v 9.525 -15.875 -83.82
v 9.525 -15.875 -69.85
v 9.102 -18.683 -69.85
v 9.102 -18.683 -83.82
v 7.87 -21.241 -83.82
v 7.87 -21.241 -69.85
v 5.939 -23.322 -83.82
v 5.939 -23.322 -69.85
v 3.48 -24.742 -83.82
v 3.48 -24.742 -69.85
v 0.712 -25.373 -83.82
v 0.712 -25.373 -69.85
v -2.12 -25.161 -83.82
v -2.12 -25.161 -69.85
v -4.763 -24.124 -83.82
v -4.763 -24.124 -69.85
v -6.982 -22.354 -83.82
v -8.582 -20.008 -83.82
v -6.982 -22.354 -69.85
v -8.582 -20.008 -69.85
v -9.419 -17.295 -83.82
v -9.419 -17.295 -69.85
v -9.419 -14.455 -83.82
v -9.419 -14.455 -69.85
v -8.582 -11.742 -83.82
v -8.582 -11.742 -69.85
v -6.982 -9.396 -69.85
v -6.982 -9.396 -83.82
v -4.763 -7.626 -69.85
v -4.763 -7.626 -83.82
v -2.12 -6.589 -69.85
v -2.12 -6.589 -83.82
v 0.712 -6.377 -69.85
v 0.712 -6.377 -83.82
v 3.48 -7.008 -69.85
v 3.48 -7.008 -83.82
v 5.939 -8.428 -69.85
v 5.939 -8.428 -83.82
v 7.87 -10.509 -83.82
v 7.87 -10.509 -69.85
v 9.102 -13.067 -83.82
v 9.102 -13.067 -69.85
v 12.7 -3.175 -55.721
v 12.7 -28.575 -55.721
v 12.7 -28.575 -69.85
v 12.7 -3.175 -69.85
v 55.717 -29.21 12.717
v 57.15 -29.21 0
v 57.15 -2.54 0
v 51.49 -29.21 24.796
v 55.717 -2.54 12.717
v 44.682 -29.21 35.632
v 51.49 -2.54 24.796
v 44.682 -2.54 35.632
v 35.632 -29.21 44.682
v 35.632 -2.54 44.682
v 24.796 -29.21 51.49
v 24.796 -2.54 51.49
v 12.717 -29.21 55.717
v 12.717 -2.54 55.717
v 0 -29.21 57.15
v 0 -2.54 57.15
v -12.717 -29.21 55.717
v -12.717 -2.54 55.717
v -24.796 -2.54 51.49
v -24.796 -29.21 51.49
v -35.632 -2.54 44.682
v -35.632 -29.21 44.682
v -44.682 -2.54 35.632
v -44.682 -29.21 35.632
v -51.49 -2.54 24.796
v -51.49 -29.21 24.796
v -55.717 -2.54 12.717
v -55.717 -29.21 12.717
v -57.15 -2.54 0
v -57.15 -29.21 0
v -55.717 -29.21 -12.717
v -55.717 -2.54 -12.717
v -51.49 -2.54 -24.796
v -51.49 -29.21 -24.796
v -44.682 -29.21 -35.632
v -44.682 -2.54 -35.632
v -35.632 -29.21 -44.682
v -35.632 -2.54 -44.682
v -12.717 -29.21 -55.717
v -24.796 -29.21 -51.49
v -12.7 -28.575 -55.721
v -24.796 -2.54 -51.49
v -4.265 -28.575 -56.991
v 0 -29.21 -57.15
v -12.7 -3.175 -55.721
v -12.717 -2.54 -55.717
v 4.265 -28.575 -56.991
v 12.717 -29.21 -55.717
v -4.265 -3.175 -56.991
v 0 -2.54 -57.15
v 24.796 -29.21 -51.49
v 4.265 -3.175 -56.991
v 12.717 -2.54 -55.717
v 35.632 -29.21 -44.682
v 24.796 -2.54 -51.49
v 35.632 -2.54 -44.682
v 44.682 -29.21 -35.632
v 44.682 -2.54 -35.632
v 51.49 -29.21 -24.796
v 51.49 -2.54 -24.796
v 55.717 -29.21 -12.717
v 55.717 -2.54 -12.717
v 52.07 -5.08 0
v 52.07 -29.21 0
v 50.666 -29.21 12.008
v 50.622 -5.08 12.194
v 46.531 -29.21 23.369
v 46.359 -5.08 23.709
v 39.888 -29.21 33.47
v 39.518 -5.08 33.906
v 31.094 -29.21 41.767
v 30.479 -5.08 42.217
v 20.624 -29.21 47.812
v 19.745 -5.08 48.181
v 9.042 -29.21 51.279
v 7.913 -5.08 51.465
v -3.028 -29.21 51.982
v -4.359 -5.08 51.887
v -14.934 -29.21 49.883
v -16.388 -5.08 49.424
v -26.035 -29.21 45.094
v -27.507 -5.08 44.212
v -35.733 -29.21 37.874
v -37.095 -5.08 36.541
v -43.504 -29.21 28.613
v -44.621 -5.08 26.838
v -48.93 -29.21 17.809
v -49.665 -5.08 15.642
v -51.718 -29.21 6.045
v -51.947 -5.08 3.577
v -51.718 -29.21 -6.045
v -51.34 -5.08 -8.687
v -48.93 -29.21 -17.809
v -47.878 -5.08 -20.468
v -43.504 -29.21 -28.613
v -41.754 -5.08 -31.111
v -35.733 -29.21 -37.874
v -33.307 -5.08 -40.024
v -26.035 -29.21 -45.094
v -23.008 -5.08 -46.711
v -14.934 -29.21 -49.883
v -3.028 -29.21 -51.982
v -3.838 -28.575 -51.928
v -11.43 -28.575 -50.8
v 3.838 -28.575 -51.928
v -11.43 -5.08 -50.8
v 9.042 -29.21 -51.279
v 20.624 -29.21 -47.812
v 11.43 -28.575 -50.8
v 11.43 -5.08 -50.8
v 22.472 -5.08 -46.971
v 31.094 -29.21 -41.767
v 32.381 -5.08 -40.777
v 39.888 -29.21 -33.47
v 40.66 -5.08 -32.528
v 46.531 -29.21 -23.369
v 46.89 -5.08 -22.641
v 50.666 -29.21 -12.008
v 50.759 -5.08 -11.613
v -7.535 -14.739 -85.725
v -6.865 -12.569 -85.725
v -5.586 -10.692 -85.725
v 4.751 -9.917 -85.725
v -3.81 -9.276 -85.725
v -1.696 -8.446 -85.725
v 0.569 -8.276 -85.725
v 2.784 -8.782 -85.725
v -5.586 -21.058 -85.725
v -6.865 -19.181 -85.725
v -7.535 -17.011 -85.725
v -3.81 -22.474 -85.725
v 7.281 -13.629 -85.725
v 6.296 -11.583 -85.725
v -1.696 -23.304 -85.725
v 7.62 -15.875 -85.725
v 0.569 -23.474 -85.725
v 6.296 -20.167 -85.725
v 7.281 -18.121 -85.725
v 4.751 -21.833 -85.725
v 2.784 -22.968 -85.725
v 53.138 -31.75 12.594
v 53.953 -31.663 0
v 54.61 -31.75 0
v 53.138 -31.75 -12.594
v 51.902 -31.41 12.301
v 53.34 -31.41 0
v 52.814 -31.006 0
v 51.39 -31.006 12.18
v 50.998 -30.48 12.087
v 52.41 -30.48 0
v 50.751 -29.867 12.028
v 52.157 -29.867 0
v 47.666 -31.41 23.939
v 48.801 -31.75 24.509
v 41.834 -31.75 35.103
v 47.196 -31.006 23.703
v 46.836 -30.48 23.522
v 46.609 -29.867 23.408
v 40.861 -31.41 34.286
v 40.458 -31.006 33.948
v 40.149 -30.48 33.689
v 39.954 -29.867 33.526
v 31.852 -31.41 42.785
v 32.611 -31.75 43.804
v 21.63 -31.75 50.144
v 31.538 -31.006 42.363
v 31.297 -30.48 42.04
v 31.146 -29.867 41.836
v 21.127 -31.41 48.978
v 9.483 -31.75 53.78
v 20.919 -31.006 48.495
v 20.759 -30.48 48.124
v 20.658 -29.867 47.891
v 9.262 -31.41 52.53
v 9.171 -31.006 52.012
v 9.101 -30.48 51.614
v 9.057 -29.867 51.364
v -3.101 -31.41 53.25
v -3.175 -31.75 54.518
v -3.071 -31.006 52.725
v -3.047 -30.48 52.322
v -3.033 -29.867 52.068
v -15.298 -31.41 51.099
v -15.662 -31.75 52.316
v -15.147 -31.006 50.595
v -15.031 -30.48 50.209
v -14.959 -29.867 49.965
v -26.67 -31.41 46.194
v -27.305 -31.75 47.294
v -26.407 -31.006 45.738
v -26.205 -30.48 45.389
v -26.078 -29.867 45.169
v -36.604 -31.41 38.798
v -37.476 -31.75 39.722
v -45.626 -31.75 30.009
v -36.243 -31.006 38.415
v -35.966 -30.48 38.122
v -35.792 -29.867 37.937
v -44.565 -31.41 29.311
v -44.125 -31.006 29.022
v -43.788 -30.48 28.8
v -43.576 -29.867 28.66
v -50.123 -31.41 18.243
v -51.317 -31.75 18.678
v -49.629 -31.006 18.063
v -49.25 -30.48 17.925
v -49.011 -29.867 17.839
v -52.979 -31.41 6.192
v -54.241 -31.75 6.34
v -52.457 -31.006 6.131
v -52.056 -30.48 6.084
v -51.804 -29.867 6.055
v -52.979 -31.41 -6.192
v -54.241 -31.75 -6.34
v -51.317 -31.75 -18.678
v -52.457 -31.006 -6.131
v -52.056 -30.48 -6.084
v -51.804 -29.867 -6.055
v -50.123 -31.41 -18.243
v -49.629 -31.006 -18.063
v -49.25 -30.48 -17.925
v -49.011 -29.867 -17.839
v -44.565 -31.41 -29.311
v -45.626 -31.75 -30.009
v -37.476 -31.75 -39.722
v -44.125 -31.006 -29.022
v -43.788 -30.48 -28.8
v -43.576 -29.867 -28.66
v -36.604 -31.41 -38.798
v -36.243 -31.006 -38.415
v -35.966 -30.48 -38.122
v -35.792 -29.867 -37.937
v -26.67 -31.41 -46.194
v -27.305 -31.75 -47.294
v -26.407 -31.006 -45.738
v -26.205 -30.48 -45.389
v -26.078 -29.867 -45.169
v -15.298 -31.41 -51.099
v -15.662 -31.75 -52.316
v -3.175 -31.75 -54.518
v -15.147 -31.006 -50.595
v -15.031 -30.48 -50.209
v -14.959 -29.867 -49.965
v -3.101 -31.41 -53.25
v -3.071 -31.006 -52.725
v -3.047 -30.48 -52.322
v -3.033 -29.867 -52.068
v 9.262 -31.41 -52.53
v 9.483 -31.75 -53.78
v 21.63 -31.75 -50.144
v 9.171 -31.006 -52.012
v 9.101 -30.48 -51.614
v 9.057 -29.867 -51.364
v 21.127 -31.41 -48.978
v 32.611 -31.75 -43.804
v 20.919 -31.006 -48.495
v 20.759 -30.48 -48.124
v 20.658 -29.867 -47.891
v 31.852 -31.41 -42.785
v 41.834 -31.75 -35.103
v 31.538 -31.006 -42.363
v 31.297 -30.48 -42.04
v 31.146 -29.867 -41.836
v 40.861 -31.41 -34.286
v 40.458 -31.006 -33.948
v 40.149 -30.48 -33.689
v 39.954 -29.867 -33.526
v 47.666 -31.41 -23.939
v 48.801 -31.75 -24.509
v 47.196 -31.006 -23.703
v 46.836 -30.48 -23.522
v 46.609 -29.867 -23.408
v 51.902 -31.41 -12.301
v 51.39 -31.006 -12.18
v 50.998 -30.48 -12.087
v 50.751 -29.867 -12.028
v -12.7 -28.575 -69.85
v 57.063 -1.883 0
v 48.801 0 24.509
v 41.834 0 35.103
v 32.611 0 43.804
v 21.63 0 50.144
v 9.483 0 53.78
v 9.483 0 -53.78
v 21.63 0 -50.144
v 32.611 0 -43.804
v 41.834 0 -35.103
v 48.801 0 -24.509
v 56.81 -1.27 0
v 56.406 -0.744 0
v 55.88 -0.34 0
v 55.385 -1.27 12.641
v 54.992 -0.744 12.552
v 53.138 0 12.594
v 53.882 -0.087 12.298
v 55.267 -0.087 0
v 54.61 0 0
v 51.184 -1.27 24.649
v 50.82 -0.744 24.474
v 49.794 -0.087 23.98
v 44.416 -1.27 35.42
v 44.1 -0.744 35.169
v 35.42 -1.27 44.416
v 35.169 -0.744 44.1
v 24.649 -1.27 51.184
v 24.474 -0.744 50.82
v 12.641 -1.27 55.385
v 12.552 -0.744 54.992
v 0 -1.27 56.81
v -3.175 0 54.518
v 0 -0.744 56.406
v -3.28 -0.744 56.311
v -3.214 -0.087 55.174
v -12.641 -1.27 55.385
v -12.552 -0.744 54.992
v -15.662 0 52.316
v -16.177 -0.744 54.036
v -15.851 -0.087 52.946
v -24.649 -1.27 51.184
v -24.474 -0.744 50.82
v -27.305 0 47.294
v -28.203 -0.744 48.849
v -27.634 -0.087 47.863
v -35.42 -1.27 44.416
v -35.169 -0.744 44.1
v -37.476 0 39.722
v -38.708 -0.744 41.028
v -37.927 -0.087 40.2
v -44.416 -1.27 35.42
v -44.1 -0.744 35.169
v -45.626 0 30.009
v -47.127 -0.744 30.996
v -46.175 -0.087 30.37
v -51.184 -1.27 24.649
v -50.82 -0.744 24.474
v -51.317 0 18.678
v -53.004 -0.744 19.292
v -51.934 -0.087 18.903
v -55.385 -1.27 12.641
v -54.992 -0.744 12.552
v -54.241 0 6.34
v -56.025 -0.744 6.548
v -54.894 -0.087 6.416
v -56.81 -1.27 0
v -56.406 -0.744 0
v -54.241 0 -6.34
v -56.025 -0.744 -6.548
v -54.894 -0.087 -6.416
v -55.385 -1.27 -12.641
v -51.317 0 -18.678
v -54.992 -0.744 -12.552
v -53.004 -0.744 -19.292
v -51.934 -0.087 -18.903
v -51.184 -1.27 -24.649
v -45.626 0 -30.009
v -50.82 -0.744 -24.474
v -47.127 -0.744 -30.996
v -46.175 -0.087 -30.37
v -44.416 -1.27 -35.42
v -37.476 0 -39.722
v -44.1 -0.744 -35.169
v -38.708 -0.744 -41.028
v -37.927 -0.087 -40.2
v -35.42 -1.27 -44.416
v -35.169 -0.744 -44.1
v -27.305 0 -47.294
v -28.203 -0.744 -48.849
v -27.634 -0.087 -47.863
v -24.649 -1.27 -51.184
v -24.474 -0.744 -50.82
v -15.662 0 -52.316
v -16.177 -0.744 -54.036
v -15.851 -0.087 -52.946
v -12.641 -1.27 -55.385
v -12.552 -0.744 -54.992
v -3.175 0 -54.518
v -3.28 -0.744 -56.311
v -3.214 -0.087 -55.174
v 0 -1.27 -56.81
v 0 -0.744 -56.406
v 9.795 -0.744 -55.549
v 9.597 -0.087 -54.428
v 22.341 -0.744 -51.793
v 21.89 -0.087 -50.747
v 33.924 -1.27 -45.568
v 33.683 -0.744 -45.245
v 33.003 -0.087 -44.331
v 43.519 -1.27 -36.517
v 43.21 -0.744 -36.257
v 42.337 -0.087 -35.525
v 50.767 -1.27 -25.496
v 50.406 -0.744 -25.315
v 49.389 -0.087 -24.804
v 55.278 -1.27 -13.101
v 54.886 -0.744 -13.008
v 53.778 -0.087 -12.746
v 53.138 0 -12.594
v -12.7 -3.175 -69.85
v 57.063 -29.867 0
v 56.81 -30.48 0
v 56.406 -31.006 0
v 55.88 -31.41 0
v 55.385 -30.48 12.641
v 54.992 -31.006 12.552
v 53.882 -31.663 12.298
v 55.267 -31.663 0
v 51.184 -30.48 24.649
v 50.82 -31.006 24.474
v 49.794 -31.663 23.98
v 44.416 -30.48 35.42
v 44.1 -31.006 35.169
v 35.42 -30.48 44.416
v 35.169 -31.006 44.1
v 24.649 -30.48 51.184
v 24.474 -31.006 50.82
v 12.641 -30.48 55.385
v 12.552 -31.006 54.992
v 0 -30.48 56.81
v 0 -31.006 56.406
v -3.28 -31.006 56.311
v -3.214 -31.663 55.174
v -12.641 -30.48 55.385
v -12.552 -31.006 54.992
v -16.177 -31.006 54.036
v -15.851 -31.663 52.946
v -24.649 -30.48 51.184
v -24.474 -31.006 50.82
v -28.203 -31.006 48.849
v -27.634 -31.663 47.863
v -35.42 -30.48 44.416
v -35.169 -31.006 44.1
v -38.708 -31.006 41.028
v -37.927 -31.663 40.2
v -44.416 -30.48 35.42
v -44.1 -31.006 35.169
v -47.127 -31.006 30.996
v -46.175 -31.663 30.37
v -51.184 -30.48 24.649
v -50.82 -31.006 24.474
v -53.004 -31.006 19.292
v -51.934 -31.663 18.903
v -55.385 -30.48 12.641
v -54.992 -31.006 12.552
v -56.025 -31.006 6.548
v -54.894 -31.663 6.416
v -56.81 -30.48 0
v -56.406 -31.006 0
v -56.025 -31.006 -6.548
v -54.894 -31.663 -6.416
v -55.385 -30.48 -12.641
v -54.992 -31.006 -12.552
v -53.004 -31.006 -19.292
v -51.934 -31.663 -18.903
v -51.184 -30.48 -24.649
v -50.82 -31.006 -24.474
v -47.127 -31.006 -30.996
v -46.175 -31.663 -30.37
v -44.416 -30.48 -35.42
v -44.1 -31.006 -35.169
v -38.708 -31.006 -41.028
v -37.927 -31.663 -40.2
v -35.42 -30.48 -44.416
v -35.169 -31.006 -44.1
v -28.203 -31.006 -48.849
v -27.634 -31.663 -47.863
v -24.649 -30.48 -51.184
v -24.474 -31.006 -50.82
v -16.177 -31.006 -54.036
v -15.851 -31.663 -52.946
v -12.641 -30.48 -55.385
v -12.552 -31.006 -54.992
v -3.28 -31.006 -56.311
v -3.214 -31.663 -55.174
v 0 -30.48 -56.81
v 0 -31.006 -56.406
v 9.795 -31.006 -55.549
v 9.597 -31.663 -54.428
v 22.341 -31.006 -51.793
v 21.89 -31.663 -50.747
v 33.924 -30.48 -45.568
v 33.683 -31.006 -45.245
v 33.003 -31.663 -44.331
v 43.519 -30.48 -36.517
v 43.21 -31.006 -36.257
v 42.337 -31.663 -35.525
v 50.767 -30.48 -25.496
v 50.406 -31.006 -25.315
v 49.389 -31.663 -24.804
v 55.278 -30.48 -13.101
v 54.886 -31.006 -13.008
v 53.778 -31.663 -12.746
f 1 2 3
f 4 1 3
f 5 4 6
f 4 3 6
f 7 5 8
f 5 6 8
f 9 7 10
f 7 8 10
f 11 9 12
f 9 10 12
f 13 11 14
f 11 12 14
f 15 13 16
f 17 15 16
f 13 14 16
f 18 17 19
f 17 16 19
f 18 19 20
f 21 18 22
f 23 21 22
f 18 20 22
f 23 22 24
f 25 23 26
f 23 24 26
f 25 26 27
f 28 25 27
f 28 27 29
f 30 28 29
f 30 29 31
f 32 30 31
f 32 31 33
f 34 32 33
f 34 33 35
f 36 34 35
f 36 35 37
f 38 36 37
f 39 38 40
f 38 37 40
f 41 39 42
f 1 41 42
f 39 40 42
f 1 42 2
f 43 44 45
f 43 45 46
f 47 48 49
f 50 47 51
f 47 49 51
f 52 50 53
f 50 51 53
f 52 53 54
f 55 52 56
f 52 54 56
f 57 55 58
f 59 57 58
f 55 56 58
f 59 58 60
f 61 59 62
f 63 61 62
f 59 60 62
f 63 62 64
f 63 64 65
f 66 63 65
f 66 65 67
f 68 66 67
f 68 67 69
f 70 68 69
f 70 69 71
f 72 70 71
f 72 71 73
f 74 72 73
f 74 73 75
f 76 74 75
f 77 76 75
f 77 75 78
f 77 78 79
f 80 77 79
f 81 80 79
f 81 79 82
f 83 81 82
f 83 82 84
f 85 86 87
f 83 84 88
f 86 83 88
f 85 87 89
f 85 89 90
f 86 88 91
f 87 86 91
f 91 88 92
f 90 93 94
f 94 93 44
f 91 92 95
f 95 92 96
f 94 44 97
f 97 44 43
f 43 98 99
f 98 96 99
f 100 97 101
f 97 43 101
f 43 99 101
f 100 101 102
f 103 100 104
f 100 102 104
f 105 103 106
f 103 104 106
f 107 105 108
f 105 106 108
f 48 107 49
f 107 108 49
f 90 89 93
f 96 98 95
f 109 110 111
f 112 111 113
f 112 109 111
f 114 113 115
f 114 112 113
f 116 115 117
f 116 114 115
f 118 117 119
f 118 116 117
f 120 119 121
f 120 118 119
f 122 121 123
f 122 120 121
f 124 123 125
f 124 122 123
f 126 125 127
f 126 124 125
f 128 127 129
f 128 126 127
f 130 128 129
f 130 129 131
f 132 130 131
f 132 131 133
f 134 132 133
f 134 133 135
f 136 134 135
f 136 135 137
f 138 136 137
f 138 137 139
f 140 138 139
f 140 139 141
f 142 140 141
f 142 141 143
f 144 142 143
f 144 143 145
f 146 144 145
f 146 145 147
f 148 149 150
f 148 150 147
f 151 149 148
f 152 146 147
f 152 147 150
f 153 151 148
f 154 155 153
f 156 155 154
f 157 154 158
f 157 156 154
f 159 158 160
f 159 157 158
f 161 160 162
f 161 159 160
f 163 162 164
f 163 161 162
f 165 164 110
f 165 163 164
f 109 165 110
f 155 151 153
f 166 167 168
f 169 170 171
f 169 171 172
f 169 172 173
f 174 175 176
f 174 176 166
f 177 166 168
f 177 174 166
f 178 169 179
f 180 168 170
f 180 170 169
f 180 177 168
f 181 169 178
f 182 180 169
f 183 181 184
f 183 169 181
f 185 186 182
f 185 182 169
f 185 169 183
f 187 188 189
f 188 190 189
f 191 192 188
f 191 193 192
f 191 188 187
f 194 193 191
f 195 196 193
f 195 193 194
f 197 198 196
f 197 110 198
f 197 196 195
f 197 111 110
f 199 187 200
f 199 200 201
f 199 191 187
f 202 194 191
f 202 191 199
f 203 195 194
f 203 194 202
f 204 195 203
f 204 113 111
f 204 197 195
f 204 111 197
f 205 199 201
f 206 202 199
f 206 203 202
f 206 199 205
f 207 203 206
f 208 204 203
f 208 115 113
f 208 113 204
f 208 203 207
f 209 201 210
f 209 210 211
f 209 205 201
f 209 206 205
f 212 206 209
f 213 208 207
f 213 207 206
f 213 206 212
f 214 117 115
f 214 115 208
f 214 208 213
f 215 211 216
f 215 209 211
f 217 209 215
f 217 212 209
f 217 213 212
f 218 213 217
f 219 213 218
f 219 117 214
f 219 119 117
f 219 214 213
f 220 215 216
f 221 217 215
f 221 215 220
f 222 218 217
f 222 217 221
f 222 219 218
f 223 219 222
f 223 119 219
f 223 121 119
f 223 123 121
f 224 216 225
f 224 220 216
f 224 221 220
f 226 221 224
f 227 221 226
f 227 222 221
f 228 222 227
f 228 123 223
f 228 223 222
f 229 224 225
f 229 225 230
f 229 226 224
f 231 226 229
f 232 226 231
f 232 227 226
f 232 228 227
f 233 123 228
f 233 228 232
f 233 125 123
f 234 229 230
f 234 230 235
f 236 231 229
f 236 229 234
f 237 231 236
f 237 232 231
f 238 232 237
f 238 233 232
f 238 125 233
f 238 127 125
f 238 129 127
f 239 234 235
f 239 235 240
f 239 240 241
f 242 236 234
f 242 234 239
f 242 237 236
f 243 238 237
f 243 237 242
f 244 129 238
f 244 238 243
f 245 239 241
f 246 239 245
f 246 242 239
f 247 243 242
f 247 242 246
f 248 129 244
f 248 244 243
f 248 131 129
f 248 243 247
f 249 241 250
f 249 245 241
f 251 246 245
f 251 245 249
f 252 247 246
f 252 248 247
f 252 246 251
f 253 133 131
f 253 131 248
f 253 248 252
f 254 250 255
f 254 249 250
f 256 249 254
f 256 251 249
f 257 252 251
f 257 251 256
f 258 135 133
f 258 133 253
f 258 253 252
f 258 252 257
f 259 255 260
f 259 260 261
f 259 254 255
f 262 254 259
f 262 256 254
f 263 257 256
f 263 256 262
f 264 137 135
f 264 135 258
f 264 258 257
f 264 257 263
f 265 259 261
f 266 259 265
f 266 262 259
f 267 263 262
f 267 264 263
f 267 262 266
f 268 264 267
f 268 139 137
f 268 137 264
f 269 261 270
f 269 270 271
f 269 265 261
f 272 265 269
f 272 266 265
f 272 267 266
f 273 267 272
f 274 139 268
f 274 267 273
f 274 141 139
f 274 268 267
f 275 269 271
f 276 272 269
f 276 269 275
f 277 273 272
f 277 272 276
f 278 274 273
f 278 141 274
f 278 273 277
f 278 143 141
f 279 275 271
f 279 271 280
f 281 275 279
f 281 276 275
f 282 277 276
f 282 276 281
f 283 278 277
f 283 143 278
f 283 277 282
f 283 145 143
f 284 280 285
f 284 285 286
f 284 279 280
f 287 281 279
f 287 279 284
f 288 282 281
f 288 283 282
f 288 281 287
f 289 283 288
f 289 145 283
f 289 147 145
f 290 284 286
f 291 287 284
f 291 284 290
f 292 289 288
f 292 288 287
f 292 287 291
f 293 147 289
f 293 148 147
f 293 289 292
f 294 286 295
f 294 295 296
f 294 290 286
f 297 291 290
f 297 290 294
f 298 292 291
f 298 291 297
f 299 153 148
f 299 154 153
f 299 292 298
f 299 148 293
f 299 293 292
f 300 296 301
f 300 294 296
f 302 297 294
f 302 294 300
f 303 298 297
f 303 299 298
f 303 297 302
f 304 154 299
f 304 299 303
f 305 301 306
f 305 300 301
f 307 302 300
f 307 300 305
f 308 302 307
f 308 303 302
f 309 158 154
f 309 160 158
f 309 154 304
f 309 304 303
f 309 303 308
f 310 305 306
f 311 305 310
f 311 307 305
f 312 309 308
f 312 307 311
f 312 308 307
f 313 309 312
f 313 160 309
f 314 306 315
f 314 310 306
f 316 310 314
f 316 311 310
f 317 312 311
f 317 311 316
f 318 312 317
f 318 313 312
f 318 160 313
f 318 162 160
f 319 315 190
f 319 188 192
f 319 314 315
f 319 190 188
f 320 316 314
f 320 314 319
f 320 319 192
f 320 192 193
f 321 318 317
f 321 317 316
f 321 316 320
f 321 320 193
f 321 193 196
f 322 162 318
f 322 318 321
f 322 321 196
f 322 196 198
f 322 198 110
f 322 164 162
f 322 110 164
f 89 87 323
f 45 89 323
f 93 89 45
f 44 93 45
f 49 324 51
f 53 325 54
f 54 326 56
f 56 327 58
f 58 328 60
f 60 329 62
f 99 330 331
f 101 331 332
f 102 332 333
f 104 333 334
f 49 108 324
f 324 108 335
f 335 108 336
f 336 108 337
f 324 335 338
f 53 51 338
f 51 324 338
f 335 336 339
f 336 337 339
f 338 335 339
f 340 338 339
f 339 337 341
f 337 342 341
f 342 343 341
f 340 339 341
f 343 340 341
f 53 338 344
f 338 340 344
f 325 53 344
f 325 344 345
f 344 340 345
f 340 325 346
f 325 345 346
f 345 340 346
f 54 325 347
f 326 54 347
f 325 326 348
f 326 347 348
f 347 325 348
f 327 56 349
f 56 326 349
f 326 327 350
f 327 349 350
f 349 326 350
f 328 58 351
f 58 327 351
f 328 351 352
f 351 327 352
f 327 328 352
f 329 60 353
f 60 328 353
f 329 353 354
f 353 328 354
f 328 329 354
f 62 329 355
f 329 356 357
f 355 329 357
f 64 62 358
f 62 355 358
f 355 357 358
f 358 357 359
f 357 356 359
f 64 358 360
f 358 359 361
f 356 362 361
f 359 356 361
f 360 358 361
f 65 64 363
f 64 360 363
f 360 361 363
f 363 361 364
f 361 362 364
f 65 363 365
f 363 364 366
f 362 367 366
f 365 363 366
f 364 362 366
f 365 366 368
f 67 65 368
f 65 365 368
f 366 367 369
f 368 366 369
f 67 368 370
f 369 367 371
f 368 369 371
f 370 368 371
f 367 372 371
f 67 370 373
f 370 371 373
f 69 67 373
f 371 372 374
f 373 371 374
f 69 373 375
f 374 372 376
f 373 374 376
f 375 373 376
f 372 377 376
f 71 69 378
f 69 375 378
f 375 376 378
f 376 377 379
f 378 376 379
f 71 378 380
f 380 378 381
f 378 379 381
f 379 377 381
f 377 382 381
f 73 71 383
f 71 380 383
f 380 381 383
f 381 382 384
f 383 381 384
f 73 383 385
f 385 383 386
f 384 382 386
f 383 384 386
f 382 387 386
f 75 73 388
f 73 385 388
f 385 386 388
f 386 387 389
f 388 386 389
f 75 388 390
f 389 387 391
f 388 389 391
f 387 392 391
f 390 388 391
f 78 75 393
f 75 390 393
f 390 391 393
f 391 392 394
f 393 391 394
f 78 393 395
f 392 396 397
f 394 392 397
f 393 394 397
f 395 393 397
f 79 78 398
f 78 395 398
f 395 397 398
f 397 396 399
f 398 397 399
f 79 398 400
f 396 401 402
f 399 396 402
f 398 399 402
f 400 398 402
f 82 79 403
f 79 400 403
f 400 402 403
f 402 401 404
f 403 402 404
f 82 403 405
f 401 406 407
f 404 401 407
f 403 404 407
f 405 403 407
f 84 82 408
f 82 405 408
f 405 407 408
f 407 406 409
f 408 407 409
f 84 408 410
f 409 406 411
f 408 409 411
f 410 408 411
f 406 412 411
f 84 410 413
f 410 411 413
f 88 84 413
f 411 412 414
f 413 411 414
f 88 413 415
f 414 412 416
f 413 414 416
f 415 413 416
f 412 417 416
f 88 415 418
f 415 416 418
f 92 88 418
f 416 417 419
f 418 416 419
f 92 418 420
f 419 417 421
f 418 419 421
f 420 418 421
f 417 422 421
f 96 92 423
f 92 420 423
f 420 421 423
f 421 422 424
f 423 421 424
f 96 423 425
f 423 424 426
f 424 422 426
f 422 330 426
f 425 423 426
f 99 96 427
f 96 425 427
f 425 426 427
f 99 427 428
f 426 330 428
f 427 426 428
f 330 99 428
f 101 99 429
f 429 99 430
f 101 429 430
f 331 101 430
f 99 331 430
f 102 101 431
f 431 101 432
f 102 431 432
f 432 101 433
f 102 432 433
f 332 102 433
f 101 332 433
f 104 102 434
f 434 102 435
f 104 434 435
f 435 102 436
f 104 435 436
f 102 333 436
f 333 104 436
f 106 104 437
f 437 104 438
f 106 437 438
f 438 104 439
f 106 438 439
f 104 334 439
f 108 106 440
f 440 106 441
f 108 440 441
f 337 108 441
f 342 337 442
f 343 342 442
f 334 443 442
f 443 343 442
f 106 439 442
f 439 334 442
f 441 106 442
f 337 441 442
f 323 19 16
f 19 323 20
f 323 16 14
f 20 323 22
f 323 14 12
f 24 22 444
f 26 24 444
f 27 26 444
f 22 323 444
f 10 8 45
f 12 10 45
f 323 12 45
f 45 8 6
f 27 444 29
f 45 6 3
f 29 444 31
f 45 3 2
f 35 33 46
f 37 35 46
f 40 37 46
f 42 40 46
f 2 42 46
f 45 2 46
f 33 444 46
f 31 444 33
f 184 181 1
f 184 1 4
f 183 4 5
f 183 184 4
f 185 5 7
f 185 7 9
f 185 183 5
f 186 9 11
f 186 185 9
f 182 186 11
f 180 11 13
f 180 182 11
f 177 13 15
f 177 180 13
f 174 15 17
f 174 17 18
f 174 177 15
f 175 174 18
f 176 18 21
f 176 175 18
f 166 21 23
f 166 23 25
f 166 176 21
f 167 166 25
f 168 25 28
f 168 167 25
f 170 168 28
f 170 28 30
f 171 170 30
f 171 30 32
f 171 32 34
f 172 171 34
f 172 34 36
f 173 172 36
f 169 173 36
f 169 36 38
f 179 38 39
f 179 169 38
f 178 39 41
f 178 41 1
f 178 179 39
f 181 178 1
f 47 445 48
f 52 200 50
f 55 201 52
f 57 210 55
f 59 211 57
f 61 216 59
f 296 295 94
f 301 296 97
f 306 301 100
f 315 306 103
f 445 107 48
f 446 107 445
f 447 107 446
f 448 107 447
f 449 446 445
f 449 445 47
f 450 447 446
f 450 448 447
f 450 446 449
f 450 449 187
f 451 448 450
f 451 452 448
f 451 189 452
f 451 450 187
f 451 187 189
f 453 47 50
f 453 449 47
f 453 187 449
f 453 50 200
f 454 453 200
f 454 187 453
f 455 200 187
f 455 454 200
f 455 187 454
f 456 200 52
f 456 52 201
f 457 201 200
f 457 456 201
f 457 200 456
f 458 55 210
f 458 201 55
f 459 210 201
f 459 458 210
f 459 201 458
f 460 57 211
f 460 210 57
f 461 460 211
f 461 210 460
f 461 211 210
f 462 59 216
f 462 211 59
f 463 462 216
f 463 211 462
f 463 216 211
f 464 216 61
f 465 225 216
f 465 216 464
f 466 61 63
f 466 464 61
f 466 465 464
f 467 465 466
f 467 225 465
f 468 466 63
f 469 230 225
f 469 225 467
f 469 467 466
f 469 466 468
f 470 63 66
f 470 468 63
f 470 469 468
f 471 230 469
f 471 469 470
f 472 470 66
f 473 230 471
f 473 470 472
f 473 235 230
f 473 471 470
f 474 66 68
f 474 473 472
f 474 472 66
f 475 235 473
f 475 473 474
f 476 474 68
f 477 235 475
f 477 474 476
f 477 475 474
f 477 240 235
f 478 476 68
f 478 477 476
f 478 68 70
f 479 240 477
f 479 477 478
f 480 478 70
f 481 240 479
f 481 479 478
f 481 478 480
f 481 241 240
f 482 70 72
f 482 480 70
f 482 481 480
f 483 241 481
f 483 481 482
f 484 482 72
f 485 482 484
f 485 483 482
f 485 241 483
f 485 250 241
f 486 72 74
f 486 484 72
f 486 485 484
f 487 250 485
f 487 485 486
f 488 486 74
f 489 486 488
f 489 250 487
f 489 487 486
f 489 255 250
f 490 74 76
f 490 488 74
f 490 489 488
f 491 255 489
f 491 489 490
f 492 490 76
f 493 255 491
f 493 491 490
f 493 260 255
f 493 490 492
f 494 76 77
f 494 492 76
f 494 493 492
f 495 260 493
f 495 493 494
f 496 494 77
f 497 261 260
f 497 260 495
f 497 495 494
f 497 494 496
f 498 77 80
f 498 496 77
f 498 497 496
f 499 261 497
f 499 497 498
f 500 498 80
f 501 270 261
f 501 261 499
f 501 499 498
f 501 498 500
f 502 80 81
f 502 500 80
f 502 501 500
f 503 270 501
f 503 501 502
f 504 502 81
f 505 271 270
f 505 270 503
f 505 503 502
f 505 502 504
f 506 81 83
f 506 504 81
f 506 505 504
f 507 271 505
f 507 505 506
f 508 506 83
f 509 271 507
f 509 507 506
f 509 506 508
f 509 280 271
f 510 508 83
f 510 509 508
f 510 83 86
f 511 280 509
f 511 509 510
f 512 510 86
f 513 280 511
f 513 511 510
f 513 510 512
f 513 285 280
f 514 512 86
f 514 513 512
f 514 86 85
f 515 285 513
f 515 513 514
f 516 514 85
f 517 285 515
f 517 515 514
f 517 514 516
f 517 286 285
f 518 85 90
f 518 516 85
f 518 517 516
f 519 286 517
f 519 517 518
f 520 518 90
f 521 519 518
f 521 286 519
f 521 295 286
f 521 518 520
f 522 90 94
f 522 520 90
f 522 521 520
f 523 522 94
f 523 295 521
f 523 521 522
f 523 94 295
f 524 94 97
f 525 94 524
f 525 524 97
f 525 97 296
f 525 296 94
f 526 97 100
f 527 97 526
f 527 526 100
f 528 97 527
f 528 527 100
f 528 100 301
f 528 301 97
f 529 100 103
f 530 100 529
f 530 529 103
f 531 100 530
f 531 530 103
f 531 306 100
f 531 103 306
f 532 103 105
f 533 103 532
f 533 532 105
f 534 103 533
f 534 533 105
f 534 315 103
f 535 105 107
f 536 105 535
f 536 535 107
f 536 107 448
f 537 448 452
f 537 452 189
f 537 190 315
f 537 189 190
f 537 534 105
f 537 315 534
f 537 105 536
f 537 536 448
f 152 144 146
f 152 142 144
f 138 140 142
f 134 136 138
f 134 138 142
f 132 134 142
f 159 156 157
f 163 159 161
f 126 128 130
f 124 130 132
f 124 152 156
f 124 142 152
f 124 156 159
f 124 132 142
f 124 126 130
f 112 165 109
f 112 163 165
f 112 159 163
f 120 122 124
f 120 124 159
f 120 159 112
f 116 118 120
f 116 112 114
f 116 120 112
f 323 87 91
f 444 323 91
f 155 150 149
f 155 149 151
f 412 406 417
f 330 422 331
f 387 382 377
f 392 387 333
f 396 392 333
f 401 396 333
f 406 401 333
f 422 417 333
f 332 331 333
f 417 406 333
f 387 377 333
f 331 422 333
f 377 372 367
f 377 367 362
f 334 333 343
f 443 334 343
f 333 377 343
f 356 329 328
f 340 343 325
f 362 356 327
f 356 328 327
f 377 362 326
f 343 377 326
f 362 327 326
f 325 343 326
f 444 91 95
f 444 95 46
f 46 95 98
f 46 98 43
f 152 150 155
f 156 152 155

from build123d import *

# Parameters (mm, degrees)
F0_R     = 57.15
F1_DEPTH = 31.75
F2_T     = -5.08
F4_W     = 25.4
F4_H     = 25.4
F5_DEPTH = 19.05
F6_R     = 2.53999
F7_R     = 9.525
F8_DEPTH = 15.875
F9_SIZE  = 1.905


# Not quite as in the source:
# - a fillet or chamfer is up to 0.001 mm smaller than in the source, because OpenCascade refuses the exact size


with BuildPart() as f1:
    # F0 (on Front) → F1 (new body)
    with BuildSketch(Plane.XZ):
        Circle(F0_R)
    extrude(amount=F1_DEPTH)

    # F2
    f2_openings = [f1.faces().sort_by_distance(p)[0] for p in [
        (0, -31.75, 0),
    ]]
    offset(amount=F2_T, openings=f2_openings)

    # F4 (on offset) → F5 (join)
    with BuildSketch(Plane.XY.offset(-50.8)):
        with Locations((0, -15.875)):
            Rectangle(F4_W, F4_H)
    extrude(amount=-F5_DEPTH)

    # F6 (radius 2.54 in the source; OpenCascade refuses exactly that, so slightly less here)
    f6_edges = [f1.edges().sort_by_distance(p)[0] for p in [
        (-57.15, -31.75, 0),
        (-52.07, -31.75, 0),
        (-57.15, 0, 0),
    ]]
    fillet(f6_edges, radius=F6_R)

    # F7 (on face) → F8 (join)
    with BuildSketch(Plane(origin=(0, 0, -69.85), x_dir=(1, 0, 0), z_dir=(0, 0, -1))):
        with Locations((0, 15.875)):
            Circle(F7_R)
    extrude(amount=F8_DEPTH)

    # F9
    f9_edges = [f1.edges().sort_by_distance(p)[0] for p in [
        (-9.525, -15.875, -85.725),
    ]]
    chamfer(f9_edges, length=F9_SIZE)


solid = f1.part
